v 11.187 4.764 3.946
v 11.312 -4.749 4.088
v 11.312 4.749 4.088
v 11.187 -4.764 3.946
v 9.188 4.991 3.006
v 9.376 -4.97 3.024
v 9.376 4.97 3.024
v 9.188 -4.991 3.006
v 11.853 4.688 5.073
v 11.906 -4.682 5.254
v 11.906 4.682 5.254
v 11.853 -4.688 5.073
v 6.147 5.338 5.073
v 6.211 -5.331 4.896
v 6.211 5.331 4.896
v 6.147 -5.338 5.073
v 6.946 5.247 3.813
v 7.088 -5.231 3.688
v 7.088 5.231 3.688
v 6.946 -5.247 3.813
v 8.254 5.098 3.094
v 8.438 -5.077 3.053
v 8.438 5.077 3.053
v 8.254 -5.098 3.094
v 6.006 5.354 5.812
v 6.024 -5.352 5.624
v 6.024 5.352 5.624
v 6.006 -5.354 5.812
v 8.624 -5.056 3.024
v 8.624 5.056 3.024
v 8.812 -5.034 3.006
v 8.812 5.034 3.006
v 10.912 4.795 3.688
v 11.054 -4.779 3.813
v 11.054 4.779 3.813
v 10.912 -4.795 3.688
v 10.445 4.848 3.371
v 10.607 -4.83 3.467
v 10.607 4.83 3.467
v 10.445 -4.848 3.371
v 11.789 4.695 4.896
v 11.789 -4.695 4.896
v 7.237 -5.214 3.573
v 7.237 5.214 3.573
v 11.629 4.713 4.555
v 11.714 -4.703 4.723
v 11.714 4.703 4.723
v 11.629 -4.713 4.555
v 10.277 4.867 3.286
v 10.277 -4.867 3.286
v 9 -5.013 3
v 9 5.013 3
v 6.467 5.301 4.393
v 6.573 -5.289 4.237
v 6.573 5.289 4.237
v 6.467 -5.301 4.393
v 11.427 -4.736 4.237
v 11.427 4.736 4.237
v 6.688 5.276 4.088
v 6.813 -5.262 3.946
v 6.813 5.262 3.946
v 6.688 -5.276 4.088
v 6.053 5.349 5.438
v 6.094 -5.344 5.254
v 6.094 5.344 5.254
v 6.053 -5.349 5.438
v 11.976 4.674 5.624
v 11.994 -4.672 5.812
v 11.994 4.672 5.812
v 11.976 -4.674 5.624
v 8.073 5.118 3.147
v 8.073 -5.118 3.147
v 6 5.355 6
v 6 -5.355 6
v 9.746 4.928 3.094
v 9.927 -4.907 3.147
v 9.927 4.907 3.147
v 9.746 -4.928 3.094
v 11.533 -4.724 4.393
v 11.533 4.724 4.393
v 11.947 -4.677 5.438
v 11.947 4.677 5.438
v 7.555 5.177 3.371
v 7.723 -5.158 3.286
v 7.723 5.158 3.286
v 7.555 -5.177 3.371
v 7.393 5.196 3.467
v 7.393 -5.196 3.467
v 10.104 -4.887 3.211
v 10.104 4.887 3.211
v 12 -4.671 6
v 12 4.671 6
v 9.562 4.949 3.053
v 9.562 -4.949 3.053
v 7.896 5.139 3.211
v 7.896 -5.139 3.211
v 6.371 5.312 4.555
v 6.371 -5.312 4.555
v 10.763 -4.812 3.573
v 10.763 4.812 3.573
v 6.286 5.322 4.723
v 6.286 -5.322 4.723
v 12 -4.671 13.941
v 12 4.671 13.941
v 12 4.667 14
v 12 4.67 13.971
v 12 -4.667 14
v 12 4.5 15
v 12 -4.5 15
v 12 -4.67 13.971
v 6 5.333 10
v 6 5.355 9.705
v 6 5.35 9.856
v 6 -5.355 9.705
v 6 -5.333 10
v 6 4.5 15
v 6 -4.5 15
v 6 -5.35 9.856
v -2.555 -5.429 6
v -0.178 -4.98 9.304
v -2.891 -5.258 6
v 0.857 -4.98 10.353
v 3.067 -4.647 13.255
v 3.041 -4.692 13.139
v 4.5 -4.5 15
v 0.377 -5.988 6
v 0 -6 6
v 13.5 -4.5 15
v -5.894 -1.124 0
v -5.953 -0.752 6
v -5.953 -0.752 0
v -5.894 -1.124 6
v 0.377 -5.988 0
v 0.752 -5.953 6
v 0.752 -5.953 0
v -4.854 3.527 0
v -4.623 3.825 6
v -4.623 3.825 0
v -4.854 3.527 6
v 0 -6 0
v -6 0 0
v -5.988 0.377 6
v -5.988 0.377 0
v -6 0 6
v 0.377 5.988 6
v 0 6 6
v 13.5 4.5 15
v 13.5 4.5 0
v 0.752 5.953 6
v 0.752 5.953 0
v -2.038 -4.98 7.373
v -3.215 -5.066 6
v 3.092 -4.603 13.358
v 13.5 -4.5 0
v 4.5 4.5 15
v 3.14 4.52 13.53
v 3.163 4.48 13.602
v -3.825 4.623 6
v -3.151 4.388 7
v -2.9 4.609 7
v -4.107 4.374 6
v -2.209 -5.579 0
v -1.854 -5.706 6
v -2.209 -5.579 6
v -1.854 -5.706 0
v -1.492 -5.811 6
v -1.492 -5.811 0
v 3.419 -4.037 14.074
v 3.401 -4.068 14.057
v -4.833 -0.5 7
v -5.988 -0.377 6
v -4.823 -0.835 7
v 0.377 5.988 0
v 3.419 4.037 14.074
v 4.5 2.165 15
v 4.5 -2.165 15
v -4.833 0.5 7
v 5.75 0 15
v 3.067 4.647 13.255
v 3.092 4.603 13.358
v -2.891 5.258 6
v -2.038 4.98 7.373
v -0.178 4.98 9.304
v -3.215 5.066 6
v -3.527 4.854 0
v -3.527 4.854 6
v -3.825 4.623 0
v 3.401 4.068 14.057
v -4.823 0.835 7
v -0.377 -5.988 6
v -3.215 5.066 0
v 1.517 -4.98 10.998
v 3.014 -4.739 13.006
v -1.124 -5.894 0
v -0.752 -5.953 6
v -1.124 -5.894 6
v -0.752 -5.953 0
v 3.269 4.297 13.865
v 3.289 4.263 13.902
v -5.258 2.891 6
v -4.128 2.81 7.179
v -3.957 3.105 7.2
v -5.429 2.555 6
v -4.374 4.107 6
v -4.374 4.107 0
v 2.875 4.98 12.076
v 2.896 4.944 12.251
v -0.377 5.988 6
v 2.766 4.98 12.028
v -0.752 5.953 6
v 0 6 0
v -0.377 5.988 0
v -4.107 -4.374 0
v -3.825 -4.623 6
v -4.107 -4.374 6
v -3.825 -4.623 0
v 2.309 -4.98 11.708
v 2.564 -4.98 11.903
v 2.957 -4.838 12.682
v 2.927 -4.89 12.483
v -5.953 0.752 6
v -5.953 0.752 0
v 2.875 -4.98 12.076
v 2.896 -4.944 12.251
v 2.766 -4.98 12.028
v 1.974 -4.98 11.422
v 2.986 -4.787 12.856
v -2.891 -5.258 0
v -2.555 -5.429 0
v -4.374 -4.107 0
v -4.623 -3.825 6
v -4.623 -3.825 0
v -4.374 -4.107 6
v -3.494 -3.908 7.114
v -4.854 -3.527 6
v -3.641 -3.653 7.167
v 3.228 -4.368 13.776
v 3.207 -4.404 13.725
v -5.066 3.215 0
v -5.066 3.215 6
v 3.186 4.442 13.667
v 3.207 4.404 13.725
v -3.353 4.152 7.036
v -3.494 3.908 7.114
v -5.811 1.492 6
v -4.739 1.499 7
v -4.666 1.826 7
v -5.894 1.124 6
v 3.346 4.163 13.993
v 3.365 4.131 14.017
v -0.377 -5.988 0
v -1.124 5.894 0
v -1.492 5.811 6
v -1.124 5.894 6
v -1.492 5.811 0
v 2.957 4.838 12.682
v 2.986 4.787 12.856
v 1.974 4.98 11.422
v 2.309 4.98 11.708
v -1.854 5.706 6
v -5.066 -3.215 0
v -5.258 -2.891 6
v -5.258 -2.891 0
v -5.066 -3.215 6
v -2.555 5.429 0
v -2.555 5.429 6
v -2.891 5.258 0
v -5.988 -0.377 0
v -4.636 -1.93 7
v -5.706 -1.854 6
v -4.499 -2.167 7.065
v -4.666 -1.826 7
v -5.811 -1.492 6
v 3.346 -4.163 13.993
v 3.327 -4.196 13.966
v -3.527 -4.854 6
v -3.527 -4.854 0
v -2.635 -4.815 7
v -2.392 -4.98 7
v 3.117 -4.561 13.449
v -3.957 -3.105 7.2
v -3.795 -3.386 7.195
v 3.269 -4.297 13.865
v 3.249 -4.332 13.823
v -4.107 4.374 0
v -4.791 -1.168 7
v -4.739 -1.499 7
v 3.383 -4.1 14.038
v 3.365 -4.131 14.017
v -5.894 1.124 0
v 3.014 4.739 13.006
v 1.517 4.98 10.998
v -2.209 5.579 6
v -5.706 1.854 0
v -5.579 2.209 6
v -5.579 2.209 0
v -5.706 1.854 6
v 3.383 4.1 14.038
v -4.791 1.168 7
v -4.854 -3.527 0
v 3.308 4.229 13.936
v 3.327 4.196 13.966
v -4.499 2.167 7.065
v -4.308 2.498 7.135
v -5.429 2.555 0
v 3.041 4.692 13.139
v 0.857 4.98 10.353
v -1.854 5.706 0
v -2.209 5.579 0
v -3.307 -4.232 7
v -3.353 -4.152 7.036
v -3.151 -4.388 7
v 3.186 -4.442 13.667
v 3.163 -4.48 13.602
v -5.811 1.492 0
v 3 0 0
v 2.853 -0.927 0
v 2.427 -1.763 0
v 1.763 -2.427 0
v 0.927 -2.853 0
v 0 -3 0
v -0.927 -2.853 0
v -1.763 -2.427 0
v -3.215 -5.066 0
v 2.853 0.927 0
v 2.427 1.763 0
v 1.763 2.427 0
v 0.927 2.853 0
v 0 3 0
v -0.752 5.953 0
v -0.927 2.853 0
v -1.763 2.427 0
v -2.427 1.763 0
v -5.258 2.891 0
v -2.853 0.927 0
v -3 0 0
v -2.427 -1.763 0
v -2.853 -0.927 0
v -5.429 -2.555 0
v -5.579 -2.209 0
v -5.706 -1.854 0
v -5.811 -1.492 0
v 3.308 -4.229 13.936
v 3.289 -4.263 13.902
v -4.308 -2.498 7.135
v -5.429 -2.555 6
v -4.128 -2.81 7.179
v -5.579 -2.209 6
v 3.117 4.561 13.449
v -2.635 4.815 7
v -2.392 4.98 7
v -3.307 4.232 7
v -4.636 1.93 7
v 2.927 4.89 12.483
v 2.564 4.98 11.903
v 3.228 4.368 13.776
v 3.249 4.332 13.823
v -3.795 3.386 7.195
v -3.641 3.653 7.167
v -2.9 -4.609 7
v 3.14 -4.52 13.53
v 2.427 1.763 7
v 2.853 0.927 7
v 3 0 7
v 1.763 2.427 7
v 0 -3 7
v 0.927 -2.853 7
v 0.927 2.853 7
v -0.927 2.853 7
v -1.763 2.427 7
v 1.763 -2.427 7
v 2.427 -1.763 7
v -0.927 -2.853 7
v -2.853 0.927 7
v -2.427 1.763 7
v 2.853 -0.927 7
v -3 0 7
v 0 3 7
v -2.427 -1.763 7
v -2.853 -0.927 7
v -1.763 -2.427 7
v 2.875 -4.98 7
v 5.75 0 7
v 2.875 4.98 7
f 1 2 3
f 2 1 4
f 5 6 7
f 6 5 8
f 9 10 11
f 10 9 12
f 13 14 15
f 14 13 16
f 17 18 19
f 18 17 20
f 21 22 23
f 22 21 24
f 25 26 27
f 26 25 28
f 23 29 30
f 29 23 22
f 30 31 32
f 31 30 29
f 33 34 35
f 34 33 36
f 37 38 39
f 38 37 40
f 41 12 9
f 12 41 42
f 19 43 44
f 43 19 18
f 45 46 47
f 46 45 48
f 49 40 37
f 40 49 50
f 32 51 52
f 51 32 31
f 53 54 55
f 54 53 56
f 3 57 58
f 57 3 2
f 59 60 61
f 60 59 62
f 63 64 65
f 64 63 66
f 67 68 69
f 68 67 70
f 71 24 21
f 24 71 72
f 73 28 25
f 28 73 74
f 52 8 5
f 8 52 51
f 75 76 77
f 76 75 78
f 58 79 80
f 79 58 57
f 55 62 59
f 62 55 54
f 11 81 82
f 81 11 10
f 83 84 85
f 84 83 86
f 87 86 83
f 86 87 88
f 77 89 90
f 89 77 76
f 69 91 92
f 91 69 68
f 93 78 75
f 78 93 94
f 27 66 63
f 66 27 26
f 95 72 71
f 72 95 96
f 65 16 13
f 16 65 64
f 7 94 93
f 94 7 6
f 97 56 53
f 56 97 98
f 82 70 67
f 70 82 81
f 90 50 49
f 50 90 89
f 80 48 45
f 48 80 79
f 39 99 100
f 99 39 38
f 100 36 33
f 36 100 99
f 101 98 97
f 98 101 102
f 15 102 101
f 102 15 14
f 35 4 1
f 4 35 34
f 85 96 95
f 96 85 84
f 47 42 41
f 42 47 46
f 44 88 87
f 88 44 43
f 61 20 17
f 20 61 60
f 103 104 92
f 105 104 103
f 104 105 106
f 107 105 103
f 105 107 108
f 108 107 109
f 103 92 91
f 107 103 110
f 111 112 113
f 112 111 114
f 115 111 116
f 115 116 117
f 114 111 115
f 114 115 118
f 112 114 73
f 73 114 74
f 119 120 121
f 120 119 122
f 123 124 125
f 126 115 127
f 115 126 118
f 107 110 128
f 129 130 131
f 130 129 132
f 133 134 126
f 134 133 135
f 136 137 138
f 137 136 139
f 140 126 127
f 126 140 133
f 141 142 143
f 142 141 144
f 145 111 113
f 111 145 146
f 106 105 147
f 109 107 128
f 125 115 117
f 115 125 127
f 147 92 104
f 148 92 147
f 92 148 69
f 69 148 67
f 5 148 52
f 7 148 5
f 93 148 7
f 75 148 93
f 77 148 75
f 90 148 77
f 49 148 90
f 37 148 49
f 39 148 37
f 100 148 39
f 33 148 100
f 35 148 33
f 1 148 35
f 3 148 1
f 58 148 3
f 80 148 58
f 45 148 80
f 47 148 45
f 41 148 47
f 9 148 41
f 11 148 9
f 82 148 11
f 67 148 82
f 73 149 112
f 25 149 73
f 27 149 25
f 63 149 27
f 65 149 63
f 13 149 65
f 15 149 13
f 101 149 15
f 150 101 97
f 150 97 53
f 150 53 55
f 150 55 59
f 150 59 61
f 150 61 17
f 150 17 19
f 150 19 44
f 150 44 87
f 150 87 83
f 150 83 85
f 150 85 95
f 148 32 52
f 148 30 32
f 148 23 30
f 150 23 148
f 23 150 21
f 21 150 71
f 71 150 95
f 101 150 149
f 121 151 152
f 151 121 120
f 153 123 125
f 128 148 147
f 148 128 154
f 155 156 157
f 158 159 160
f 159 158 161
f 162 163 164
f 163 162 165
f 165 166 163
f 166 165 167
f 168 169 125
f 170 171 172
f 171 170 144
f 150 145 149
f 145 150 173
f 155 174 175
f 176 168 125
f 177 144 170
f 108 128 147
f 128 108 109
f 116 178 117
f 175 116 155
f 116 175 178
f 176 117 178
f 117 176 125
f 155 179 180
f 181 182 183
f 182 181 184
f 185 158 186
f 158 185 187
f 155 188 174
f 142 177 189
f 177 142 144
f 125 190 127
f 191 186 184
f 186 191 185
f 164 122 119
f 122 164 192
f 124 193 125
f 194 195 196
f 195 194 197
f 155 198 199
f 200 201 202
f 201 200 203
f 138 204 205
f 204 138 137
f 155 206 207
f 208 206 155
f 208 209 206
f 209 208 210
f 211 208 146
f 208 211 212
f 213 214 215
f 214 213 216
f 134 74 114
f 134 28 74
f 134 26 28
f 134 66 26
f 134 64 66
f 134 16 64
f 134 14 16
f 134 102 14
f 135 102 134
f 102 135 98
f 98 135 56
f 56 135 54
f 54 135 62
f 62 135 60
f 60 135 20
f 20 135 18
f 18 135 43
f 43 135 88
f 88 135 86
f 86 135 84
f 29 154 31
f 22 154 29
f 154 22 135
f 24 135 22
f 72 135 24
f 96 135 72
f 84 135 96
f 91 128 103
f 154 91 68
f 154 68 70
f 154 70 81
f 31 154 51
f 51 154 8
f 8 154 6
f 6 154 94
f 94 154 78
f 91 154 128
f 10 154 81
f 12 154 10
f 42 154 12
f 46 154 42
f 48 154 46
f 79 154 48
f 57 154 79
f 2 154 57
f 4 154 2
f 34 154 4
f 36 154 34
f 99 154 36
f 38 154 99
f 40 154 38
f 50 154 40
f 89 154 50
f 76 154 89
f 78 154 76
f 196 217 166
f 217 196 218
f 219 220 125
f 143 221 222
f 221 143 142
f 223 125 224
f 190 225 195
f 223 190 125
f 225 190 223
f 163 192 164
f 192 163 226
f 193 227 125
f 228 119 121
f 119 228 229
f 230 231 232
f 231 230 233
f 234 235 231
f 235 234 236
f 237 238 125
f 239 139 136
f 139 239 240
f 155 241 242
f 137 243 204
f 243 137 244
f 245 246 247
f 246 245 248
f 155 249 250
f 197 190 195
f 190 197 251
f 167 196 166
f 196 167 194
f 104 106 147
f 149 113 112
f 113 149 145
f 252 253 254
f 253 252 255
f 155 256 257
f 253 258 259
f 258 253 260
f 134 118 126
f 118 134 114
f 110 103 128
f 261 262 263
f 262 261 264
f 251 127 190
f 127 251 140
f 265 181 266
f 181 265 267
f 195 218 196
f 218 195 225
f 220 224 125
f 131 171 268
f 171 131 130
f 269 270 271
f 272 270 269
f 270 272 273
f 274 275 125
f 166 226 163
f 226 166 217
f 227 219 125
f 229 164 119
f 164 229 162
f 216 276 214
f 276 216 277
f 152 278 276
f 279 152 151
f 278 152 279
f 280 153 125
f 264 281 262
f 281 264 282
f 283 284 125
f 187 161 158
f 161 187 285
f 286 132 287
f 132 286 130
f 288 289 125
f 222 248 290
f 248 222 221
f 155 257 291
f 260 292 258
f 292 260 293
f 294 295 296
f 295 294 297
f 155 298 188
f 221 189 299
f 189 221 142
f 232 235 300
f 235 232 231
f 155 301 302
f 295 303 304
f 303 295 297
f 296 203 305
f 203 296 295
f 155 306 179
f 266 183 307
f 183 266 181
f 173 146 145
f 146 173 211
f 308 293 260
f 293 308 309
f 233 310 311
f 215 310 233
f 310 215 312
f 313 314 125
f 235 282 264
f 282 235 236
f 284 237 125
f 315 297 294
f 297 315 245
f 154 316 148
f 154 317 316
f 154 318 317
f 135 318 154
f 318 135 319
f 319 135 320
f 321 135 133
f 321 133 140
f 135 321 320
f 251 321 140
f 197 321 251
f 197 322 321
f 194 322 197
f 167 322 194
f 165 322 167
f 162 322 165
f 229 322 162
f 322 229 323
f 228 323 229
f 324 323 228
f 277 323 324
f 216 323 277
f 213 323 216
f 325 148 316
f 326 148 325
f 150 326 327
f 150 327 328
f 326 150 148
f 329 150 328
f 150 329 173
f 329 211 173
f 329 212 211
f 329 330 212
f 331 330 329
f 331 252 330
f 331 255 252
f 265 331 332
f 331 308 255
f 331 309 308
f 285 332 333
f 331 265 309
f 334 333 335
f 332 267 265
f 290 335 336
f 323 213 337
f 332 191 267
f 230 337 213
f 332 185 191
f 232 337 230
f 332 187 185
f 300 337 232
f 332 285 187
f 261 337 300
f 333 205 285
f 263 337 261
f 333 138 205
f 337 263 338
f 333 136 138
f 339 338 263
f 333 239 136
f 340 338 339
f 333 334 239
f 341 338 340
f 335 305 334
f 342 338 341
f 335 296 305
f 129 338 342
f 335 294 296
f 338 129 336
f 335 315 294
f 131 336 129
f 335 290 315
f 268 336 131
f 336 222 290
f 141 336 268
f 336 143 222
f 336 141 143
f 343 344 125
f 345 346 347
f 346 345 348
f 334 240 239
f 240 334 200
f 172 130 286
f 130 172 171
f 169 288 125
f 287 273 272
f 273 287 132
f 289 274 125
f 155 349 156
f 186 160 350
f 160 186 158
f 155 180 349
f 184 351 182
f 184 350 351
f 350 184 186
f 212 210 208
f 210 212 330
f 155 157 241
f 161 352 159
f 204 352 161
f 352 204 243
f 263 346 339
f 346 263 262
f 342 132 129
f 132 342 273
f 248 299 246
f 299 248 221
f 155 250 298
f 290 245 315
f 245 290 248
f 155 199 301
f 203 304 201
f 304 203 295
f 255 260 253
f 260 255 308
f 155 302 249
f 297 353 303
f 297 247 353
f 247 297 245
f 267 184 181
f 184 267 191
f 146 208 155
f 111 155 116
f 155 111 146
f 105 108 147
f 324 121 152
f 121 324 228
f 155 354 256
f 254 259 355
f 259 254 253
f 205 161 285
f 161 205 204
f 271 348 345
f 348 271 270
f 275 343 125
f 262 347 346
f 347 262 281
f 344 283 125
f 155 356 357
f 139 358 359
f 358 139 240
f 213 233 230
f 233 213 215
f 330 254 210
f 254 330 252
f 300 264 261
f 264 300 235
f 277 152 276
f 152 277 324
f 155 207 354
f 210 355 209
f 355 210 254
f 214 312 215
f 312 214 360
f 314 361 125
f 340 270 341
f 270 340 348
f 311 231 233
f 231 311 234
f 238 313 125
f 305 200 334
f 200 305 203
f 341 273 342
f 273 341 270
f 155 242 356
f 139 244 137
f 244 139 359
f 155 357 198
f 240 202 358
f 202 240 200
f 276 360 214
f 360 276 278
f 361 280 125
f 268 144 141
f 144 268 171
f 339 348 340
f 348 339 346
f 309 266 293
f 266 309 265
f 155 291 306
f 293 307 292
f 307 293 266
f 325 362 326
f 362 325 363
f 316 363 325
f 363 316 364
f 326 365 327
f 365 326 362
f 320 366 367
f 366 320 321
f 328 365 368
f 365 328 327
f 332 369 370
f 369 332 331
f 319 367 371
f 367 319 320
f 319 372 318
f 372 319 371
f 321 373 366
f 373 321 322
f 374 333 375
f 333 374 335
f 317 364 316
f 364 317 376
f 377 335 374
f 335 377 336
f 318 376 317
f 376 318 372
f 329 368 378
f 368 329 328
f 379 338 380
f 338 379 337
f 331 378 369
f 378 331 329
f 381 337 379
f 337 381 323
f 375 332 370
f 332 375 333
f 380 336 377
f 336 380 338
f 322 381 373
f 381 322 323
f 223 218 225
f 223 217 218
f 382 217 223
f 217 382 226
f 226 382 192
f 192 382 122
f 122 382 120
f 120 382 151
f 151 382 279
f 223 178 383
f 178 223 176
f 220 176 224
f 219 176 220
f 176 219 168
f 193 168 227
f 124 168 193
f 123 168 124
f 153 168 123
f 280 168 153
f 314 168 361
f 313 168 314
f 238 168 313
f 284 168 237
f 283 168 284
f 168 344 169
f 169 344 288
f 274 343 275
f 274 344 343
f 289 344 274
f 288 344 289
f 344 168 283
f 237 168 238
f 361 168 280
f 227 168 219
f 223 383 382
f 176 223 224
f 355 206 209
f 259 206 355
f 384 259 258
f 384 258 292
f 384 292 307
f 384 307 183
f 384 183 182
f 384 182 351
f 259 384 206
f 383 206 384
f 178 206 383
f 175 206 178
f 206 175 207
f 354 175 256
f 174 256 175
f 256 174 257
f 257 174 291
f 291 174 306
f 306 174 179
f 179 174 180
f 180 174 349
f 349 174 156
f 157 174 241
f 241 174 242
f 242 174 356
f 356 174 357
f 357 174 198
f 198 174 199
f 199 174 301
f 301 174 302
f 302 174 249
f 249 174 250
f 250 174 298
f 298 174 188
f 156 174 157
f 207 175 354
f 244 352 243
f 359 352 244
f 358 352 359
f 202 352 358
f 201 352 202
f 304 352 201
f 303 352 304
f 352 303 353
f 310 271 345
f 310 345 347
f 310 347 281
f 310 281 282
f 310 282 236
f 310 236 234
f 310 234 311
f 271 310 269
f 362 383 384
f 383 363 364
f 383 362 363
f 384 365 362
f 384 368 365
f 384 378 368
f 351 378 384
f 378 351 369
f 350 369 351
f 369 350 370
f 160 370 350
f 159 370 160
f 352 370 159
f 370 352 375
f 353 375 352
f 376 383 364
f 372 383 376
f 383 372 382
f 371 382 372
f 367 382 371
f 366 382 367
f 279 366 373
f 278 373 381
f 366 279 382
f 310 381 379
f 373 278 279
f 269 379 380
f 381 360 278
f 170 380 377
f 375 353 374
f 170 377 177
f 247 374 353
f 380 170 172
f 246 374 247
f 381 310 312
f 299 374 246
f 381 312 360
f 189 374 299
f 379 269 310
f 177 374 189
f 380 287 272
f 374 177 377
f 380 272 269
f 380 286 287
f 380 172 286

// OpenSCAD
// Loose Bar clamp
// Used for loose joining two rods
// GNU GPL v3
// Maciej Urbański
// rooter@kyberian.net

inf = 9999;
$fn = 100;

module loose_barclamp(rod_a_d, rod_b_d, width = 2, h = 20) {

  difference() {
    hull() {
      cylinder(h = width + rod_b_d / 2, r = rod_a_d / 2 + width);
      translate([ (rod_b_d + width) / 2, -(rod_b_d + width) / 2, 0 ])
          cube([ rod_b_d + width, rod_b_d + width, h ]);
    }

    cylinder(h = inf, d = rod_a_d, $fn = 20);
    translate([ rod_b_d + width, 0, rod_b_d / 2 + width ]) union() {
      translate([ 0, inf / 2, 0 ]) rotate([ 90, 0, 0 ])
          cylinder(d = rod_b_d, h = inf);
      translate([ -rod_b_d / 2, -inf / 2, 0 ]) cube([ rod_b_d, inf, inf ]);
    }
  }
}

difference() {
  loose_barclamp(6, 6, 3, 15);
  translate([ 0, 0, 7 ]) cylinder(h = 10, d = 11.5, $fn = 6);
}
